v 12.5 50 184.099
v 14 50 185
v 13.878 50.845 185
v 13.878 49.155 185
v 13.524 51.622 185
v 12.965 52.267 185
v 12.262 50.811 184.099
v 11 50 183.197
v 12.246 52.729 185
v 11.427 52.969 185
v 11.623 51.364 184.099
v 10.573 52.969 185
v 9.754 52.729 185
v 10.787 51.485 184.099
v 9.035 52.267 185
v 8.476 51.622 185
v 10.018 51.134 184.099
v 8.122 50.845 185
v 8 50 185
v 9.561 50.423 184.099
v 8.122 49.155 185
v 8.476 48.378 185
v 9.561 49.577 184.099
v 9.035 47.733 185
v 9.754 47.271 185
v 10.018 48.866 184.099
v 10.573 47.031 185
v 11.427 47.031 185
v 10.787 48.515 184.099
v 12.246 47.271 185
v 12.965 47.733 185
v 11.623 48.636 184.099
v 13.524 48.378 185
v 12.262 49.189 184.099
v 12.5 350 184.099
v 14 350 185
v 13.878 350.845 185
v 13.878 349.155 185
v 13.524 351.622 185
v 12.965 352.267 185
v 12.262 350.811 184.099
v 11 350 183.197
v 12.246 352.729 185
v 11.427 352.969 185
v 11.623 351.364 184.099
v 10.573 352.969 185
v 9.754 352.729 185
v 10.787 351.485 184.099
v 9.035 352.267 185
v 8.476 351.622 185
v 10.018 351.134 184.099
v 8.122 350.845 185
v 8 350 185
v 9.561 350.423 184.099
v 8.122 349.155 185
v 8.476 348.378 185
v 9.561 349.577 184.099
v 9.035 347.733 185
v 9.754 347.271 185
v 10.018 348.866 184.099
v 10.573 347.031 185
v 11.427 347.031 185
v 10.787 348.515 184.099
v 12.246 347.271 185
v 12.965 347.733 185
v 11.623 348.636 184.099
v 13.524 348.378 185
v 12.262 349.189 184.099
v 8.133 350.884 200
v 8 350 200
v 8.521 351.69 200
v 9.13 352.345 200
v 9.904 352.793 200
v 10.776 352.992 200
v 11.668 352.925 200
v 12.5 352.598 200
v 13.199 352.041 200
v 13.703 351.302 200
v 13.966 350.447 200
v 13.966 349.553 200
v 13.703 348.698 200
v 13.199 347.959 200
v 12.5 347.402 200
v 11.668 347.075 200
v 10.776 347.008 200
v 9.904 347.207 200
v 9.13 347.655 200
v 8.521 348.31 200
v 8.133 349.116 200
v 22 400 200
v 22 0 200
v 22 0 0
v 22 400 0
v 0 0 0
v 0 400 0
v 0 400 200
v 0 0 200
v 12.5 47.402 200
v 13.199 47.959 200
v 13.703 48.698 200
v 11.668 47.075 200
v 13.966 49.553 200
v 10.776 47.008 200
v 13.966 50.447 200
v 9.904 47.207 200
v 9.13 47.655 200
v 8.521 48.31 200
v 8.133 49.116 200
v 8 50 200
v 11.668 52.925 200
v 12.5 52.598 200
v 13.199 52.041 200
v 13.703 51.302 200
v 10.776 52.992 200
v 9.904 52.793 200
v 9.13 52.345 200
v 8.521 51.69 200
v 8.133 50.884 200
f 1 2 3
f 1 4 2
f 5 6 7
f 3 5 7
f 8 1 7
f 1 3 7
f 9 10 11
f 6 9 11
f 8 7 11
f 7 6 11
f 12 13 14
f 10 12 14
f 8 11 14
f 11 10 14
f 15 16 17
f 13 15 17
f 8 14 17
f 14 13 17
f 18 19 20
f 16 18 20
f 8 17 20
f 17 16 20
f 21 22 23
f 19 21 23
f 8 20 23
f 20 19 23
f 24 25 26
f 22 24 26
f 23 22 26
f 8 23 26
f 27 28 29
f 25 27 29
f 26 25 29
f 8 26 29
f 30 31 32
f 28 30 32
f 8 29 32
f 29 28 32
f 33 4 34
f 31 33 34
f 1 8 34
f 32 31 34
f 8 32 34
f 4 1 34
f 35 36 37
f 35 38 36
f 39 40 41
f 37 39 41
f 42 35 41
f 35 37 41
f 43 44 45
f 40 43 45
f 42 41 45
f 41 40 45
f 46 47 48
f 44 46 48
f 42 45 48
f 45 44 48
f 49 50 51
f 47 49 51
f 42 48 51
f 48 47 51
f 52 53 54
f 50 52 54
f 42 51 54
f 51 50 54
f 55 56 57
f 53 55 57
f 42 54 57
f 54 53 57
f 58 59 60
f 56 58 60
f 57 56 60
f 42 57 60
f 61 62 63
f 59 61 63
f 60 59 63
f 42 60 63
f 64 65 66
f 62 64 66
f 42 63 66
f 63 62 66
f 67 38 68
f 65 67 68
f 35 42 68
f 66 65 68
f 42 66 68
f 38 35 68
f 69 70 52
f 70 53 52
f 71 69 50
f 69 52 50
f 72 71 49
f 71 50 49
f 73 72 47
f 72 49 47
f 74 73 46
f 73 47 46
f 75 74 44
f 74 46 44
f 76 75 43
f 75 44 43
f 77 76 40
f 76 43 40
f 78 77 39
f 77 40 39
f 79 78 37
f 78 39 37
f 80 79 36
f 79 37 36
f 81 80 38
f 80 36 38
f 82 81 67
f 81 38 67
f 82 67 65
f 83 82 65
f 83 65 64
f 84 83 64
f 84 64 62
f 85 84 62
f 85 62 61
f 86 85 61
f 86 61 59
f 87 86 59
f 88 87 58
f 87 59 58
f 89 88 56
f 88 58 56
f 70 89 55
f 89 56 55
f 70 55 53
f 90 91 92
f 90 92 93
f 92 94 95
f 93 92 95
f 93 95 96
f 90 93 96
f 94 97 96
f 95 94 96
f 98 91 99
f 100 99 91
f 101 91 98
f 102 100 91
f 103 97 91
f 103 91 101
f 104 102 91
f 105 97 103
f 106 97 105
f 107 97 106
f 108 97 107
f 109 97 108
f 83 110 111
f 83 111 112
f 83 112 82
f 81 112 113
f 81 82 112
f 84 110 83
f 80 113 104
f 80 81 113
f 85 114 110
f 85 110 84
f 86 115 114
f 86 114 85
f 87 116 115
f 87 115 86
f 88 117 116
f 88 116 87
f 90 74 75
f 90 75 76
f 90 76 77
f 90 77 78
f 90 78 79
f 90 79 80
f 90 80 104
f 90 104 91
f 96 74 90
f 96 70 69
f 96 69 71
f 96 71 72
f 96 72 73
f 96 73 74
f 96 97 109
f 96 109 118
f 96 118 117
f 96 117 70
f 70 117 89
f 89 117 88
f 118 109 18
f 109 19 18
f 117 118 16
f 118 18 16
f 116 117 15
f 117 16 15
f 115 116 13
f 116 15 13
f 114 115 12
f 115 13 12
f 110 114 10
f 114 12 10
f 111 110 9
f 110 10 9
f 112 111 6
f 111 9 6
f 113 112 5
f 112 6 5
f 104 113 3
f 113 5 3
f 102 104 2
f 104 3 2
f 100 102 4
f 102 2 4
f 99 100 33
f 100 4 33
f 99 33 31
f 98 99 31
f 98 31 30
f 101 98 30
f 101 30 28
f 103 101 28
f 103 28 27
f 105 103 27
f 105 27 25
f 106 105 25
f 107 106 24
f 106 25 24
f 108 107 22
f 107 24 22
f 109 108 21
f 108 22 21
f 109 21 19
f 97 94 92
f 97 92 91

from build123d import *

# Parameters (mm, degrees)
F0_W     = 400
F0_H     = 200
F1_DEPTH = 22
F3_D     = 6
F3_DEPTH = 15
F3_TIP   = 1.8025818571


with BuildPart() as f1:
    # F0 (on Right) → F1 (new body)
    with BuildSketch(Plane.YZ):
        with Locations((200, 100)):
            Rectangle(F0_W, F0_H)
    extrude(amount=F1_DEPTH)

    # F3
    with Locations(Plane.XY.offset(200)):
        with Locations((11, 350), (11, 50)):
            Hole(F3_D / 2, depth=F3_DEPTH)
            with Locations((0, 0, -(F3_DEPTH + F3_TIP / 2))):  # 118° drill point
                Cone(0, F3_D / 2, F3_TIP, mode=Mode.SUBTRACT)


solid = f1.part
